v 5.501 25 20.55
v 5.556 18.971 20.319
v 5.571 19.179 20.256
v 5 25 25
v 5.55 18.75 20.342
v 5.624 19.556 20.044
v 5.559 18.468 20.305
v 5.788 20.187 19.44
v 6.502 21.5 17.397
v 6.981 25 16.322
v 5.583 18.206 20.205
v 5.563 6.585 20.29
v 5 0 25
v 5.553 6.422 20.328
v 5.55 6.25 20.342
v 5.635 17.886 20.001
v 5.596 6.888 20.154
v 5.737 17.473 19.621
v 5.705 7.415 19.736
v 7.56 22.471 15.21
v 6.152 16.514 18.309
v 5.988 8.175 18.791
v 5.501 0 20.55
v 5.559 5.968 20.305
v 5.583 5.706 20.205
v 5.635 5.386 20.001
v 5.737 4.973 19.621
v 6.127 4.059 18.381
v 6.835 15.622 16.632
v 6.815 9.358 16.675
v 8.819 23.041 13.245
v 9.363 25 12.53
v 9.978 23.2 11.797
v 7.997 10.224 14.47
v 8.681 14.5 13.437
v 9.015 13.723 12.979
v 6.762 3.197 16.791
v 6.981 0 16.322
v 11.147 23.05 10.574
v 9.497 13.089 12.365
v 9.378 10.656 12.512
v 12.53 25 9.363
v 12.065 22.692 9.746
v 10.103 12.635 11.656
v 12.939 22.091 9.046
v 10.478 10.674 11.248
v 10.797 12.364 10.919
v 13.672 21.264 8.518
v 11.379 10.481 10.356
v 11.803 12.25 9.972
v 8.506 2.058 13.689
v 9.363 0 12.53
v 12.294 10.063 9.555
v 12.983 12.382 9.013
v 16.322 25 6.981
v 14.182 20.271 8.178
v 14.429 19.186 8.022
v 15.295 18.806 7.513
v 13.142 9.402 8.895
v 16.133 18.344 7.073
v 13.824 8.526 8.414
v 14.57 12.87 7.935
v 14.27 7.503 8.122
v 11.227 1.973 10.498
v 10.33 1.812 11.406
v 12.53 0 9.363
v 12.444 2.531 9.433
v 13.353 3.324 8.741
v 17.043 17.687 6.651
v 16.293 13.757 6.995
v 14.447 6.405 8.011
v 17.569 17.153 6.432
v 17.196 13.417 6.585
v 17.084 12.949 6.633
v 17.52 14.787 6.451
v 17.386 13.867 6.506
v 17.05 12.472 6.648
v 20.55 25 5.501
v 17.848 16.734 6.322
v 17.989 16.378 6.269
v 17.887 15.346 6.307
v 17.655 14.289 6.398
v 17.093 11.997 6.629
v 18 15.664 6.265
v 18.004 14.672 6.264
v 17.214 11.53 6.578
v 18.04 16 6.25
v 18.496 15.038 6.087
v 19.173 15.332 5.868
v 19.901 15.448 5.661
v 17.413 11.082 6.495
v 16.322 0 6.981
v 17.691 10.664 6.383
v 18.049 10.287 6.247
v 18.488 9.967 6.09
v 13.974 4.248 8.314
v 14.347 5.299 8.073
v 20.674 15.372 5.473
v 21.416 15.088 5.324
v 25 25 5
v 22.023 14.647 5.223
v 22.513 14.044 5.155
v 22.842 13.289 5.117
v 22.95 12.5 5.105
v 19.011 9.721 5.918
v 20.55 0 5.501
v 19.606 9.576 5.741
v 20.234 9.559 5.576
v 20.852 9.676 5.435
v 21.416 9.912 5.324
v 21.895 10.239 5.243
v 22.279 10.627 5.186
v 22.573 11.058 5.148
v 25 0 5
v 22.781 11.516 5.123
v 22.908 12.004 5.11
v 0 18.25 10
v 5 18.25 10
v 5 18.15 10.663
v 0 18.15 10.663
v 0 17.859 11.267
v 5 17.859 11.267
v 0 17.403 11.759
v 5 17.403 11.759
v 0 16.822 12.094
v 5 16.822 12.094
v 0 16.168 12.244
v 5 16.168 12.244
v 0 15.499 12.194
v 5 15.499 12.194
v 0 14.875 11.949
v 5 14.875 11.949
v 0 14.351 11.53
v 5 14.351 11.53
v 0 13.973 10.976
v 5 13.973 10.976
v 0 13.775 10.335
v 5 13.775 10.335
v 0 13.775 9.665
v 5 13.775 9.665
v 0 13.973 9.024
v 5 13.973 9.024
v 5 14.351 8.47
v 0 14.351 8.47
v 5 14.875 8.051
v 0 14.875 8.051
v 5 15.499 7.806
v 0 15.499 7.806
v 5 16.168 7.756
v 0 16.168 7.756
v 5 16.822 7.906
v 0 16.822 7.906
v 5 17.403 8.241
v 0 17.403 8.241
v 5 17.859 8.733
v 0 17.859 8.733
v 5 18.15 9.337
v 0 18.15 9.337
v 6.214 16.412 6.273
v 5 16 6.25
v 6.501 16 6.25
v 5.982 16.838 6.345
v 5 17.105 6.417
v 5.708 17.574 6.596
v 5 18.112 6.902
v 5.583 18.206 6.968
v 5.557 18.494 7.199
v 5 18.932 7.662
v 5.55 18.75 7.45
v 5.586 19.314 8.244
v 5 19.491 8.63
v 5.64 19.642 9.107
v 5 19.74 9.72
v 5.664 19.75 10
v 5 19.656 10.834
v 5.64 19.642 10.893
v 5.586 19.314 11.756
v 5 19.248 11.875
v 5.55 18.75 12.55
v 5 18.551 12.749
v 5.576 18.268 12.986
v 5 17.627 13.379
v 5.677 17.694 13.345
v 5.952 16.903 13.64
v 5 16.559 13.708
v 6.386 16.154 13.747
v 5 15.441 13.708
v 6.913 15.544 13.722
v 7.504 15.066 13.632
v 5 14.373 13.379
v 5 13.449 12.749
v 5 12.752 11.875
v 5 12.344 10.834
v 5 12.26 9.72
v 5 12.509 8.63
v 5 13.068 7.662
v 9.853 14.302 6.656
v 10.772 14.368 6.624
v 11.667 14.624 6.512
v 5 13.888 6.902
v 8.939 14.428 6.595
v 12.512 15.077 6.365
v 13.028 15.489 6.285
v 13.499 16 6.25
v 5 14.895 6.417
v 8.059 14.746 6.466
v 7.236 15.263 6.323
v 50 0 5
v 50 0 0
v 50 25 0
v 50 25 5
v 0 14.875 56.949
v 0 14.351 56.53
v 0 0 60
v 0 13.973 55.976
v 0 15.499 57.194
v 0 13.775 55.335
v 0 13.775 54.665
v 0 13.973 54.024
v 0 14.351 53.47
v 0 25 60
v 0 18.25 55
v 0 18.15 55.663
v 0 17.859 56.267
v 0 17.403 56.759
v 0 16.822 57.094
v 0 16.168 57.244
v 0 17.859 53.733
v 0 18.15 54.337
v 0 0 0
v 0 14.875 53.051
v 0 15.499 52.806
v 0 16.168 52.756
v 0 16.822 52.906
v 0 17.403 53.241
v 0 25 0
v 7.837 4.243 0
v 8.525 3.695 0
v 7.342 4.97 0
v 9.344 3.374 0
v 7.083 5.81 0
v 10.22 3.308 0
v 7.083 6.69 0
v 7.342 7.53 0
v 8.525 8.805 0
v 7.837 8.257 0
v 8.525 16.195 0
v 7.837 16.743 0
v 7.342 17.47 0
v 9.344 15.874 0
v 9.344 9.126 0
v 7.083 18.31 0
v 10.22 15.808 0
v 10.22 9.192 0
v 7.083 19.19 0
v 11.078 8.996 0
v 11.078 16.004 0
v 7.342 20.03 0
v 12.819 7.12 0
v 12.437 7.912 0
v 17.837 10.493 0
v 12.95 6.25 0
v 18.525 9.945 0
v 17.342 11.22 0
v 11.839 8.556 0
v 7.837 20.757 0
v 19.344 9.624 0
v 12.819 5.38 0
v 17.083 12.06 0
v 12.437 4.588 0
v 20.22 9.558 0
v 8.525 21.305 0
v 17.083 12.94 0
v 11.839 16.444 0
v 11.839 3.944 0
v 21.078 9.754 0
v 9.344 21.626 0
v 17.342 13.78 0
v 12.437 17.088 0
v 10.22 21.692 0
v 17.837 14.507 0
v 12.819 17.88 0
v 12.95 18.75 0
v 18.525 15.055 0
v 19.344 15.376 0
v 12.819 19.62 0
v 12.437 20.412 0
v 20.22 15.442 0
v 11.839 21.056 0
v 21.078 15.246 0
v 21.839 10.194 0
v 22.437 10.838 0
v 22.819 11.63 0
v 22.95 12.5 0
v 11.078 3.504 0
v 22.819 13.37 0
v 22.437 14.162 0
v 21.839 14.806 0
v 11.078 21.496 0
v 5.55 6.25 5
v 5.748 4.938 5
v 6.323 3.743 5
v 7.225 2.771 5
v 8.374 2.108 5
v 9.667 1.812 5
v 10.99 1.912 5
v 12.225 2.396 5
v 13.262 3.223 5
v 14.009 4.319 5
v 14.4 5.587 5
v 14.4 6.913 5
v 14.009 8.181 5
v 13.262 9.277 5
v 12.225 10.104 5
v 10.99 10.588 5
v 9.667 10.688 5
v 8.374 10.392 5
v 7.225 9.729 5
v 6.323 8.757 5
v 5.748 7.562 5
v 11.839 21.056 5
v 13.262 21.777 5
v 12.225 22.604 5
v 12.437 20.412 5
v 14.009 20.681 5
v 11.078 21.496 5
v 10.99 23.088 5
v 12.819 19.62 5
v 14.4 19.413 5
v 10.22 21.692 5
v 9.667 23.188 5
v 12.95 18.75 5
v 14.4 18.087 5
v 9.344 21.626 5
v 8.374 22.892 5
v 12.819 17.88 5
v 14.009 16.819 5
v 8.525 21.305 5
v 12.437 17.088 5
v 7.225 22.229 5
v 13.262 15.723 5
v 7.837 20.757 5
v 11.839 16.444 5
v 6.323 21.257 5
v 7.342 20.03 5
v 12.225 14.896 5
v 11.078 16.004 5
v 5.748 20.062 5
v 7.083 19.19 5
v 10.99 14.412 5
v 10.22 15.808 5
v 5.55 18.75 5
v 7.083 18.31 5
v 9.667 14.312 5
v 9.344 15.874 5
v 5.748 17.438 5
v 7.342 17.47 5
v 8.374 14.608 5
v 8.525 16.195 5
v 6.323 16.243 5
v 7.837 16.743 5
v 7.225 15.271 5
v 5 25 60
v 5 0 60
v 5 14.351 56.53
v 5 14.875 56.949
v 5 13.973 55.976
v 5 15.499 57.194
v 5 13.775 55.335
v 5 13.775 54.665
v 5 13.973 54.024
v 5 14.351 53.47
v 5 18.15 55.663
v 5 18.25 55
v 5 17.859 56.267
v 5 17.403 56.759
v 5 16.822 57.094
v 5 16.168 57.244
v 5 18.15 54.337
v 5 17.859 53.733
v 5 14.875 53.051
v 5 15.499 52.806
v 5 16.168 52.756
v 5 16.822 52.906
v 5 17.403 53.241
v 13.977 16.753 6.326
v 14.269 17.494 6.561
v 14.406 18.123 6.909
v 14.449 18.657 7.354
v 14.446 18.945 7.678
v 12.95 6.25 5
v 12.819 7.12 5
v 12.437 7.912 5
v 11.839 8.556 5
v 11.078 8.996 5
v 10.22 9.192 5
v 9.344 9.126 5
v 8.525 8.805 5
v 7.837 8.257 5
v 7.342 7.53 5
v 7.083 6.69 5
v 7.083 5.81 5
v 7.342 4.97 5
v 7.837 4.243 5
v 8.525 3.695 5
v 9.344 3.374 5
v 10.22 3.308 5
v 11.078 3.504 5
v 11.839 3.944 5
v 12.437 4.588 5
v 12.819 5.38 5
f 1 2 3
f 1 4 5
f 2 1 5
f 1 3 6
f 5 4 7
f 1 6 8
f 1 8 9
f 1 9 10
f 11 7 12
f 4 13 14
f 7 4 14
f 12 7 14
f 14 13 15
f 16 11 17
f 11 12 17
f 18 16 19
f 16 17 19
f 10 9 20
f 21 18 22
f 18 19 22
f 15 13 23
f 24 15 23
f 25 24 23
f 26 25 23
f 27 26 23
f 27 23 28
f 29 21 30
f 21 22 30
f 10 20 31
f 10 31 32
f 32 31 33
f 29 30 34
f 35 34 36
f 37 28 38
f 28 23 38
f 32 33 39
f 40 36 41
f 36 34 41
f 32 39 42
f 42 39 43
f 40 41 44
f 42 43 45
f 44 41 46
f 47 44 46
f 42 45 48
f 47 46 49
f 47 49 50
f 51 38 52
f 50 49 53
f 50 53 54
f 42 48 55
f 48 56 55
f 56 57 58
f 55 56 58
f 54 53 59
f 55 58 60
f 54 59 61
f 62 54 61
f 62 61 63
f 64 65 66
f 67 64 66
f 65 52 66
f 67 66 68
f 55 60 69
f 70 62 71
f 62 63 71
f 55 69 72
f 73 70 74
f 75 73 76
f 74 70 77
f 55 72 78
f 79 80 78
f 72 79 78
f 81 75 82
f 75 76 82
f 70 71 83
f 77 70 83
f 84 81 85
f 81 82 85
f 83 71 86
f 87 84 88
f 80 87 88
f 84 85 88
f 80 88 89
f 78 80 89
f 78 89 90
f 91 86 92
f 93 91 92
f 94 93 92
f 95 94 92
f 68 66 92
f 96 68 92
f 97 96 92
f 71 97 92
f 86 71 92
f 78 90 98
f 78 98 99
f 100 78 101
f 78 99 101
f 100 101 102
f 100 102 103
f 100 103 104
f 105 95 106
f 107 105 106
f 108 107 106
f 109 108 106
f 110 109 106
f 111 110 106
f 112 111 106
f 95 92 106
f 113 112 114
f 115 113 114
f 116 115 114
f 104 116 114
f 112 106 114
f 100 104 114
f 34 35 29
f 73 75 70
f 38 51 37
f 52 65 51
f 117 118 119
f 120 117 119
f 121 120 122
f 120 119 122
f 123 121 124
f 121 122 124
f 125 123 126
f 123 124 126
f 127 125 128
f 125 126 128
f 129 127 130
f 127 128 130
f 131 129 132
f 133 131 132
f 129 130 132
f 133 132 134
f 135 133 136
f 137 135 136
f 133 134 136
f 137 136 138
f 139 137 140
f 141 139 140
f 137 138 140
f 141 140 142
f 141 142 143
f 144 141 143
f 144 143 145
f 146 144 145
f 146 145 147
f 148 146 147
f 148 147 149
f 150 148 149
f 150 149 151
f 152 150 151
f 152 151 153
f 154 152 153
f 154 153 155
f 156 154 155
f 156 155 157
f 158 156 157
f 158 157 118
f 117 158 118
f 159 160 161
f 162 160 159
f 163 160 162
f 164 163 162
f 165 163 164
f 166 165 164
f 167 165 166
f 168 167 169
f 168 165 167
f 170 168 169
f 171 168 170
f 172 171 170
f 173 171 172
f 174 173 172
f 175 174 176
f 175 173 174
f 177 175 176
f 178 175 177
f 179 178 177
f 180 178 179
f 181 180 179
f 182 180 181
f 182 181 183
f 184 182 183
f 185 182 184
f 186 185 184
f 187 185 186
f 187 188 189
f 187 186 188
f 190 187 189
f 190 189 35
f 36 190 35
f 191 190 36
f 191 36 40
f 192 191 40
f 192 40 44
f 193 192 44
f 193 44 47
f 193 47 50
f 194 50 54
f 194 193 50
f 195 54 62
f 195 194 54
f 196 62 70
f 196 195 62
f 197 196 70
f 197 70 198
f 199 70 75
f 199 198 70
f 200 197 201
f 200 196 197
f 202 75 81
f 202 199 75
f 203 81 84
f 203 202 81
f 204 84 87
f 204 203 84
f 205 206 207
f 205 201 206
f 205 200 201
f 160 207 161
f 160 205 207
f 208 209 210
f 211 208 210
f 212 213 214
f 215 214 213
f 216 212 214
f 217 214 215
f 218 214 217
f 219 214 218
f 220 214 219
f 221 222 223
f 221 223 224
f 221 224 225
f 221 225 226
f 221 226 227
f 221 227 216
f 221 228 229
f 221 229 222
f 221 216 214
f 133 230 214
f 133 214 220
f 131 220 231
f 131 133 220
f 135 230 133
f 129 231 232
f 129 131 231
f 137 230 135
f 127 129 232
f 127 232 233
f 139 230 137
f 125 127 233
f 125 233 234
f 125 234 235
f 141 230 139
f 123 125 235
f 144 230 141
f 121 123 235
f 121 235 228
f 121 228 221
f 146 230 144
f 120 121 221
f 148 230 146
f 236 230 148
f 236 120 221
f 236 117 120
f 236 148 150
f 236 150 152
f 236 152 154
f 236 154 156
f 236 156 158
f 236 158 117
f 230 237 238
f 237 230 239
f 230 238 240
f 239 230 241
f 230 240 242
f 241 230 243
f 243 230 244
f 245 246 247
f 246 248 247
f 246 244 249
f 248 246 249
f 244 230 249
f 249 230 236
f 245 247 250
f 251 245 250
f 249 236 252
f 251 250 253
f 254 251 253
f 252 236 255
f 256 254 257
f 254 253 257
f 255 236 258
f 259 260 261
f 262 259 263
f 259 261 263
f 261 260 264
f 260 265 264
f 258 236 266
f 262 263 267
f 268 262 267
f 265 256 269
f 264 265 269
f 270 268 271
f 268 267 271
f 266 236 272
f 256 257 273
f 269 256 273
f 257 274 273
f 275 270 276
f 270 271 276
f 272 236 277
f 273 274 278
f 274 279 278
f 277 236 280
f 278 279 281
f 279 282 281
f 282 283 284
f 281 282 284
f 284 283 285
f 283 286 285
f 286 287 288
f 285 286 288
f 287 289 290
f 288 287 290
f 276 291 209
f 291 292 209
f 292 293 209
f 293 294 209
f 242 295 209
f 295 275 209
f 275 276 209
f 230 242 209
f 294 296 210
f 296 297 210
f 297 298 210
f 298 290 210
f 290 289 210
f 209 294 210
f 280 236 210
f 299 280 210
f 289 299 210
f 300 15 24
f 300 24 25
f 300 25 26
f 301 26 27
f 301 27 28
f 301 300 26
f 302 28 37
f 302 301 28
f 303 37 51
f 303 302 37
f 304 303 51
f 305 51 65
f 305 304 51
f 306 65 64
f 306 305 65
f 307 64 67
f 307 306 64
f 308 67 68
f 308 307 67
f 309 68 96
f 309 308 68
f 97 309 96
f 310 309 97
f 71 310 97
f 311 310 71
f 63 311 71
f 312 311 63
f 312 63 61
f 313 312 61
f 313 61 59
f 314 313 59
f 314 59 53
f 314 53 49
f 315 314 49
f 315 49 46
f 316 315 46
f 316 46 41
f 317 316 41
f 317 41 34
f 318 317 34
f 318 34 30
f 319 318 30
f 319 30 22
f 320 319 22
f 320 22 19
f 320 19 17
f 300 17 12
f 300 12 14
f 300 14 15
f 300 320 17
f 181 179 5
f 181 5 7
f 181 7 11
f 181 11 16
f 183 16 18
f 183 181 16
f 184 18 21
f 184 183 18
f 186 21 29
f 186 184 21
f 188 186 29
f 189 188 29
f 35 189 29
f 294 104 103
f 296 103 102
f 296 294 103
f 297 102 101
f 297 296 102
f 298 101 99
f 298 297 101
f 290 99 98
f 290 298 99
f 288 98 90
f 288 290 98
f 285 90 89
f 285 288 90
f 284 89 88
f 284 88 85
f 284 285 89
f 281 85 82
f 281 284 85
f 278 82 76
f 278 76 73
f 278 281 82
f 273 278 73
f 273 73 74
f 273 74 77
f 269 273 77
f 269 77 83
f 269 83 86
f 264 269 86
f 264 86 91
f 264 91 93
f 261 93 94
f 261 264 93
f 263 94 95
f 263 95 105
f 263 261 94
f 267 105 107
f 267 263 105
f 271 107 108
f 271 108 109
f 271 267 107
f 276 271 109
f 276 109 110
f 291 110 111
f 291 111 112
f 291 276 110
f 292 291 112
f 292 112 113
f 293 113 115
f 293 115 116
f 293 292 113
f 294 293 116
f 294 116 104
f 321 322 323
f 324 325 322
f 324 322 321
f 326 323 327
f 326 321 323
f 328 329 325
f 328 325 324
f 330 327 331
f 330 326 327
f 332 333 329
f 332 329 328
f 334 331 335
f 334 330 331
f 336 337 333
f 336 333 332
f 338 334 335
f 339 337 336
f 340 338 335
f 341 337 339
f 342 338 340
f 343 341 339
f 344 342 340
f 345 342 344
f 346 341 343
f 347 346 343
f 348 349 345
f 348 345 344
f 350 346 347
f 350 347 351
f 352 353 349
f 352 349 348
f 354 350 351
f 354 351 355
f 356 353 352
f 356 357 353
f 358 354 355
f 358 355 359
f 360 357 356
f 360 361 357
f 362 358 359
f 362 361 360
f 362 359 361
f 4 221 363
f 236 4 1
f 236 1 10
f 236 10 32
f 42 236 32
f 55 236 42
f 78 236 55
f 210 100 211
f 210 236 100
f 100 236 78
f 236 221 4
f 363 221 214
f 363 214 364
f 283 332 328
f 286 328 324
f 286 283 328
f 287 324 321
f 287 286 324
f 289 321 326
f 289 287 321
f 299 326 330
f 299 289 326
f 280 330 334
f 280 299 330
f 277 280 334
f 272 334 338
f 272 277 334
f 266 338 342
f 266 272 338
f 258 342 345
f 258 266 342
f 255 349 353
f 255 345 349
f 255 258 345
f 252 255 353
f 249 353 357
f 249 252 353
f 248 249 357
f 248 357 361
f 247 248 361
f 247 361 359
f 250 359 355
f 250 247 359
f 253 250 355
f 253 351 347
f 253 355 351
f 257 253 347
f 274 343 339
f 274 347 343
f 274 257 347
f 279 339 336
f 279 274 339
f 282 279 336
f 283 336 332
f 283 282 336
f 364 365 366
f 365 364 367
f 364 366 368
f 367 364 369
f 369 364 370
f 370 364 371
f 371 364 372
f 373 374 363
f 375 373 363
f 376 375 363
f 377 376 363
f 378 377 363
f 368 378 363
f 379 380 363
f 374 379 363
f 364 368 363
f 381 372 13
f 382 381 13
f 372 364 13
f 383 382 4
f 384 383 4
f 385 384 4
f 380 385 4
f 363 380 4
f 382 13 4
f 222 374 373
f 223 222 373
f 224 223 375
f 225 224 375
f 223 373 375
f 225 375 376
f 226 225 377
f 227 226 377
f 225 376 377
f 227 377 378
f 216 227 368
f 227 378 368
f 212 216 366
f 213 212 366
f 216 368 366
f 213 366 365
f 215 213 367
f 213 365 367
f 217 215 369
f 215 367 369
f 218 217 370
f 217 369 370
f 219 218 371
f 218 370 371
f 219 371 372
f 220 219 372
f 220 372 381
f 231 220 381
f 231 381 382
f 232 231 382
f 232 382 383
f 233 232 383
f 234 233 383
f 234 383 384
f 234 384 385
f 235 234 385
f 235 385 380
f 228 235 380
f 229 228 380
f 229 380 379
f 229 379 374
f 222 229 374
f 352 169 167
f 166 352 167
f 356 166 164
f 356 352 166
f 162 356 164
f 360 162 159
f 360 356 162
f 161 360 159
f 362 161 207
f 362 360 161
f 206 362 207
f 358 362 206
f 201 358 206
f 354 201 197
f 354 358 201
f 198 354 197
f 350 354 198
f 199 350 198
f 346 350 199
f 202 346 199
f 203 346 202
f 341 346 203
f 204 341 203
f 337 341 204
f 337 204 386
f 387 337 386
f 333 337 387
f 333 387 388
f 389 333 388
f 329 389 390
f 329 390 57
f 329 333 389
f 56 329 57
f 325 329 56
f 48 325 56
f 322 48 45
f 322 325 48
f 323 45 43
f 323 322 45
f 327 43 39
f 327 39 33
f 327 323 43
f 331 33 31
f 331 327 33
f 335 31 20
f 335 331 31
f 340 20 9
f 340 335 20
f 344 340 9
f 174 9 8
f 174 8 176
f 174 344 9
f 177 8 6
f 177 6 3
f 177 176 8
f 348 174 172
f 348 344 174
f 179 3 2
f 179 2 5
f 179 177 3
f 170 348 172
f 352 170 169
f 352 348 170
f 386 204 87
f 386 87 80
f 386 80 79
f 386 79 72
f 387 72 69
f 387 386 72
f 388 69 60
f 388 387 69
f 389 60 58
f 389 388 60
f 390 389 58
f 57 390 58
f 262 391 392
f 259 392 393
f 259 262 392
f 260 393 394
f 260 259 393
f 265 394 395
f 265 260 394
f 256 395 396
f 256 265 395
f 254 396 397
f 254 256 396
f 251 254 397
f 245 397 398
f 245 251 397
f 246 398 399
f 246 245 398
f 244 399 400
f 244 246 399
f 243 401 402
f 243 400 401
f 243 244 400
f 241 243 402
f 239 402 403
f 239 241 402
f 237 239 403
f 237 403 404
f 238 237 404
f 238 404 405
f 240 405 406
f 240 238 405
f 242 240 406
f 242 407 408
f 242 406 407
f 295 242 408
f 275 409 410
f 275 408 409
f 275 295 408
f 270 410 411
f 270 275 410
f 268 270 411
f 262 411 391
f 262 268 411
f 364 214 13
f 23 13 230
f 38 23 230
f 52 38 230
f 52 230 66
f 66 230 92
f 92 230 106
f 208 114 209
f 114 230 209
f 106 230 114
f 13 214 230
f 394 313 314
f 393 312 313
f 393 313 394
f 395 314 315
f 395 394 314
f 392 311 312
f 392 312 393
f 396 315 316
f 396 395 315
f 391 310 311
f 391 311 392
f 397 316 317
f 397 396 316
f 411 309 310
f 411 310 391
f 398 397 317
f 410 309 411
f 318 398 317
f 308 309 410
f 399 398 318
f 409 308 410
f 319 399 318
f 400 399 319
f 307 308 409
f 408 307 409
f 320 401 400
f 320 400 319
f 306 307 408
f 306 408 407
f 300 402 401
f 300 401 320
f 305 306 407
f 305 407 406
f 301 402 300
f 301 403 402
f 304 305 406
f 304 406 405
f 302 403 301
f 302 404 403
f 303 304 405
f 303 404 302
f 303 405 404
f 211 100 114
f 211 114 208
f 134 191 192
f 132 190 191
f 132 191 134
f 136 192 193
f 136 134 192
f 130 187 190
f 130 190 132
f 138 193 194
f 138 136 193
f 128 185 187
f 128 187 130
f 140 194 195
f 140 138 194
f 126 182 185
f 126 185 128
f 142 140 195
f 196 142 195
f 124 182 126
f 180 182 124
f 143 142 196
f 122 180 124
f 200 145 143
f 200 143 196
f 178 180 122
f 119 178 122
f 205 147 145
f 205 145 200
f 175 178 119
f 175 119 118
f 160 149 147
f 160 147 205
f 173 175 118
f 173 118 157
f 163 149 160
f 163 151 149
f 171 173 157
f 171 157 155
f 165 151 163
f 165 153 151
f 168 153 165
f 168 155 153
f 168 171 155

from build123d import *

# Parameters (mm, degrees)
CROQUIS1_W                   = 50
CROQUIS1_H                   = 25
CROQUIS1_R                   = 2.95
SALIENTE_EXTRUIR1_DEPTH      = 5
CROQUIS1_3_W                 = 5
CROQUIS1_3_H                 = 25
SALIENTE_EXTRUIR2_DEPTH      = 60
REDONDEO2_DEPTH              = 25
REDONDEO2_START              = 5
REDONDEO2_2_OUTLINE_R        = 2.95
REDONDEO2_2_DEPTH            = 20
CROQUIS4_R                   = 4.45
CORTAR_EXTRUIR1_DEPTH        = 79.421935739
CROQUIS5_R                   = 2.25
CORTAR_EXTRUIR2_DEPTH        = 80.056941536
CROQUIS5_3_R                 = 3.75
CROQUIS5_3_R_2               = 2.25
CORTAR_EXTRUIR_L_MINA3_DEPTH = 80.056941536


with BuildPart() as part:
    # Croquis1 → Saliente-Extruir1 (new body)
    with BuildSketch(Plane.XY):
        with Locations((25, 12.5)):
            Rectangle(CROQUIS1_W, CROQUIS1_H)
        with Locations((10, 18.75)):
            Circle(CROQUIS1_R, mode=Mode.SUBTRACT)
        with Locations((10, 6.25)):
            Circle(CROQUIS1_R, mode=Mode.SUBTRACT)
        with Locations((20, 12.5)):
            Circle(CROQUIS1_R, mode=Mode.SUBTRACT)
    extrude(amount=SALIENTE_EXTRUIR1_DEPTH)

    # Croquis1<3> → Saliente-Extruir2 (add)
    with BuildSketch(Plane.XY):
        with Locations((2.5, 12.5)):
            Rectangle(CROQUIS1_3_W, CROQUIS1_3_H)
    extrude(amount=SALIENTE_EXTRUIR2_DEPTH)

    # Redondeo2: read off the stored shape, not the designer's step
    # Redondeo2 outline → Redondeo2 (add)
    with BuildSketch(Plane(origin=(0, 0, 0), x_dir=(1, 0, 0), z_dir=(0, 1, 0))):
        with BuildLine():
            Line((5, -5), (5, -25))
            ThreePointArc((5, -25), (10.857864376, -10.857864376), (25, -5))
            Line((25, -5), (5, -5))
        make_face()
    extrude(amount=REDONDEO2_DEPTH)

    # Redondeo2 2 outline → Redondeo2 2 (cut)
    with BuildSketch(Plane.XY.offset(REDONDEO2_START)):
        with Locations((10, 18.75)):
            Circle(REDONDEO2_2_OUTLINE_R)
        with Locations((20, 12.5)):
            Circle(REDONDEO2_2_OUTLINE_R)
        with Locations((10, 6.25)):
            Circle(REDONDEO2_2_OUTLINE_R)
    extrude(amount=REDONDEO2_2_DEPTH, mode=Mode.SUBTRACT)

    # Croquis4 → Cortar-Extruir1 (cut, through all)
    with BuildSketch(Plane.XY.offset(5)):
        with Locations(Location((10, 18.75, 0), (0, 0, 180))):
            Circle(CROQUIS4_R)
        with Locations(Location((10, 6.25, 0), (0, 0, 180))):
            Circle(CROQUIS4_R)
    extrude(amount=CORTAR_EXTRUIR1_DEPTH, mode=Mode.SUBTRACT)

    # Croquis5 → Cortar-Extruir2 (cut, through all)
    with BuildSketch(Plane(origin=(5, 0, 0), x_dir=(0, 0, -1), z_dir=(1, 0, 0))):
        with Locations(Location((-55, 16, 0), (0, 0, 90))):
            Circle(CROQUIS5_R)
        with Locations(Location((-10, 16, 0), (0, 0, 90))):
            Circle(CROQUIS5_R)
    extrude(amount=-CORTAR_EXTRUIR2_DEPTH, mode=Mode.SUBTRACT)

    # Croquis5<3> → Cortar-Extruir-Lámina3 (cut, through all)
    with BuildSketch(Plane(origin=(5, 0, 0), x_dir=(0, 0, -1), z_dir=(1, 0, 0))):
        with Locations((-10, 16)):
            Circle(CROQUIS5_3_R)
        with Locations((-10, 16)):
            Circle(CROQUIS5_3_R_2, mode=Mode.SUBTRACT)
    extrude(amount=CORTAR_EXTRUIR_L_MINA3_DEPTH, mode=Mode.SUBTRACT)


with BuildPart() as cortar_extruir_l_mina3_kept_piece:
    # of the separate pieces the step leaves, the one the design keeps (cortar_extruir_l_mina3_pieces_kept)
    add(part.part.solids().sort_by_distance((0, 0, 0))[0])


solid = cortar_extruir_l_mina3_kept_piece.part
